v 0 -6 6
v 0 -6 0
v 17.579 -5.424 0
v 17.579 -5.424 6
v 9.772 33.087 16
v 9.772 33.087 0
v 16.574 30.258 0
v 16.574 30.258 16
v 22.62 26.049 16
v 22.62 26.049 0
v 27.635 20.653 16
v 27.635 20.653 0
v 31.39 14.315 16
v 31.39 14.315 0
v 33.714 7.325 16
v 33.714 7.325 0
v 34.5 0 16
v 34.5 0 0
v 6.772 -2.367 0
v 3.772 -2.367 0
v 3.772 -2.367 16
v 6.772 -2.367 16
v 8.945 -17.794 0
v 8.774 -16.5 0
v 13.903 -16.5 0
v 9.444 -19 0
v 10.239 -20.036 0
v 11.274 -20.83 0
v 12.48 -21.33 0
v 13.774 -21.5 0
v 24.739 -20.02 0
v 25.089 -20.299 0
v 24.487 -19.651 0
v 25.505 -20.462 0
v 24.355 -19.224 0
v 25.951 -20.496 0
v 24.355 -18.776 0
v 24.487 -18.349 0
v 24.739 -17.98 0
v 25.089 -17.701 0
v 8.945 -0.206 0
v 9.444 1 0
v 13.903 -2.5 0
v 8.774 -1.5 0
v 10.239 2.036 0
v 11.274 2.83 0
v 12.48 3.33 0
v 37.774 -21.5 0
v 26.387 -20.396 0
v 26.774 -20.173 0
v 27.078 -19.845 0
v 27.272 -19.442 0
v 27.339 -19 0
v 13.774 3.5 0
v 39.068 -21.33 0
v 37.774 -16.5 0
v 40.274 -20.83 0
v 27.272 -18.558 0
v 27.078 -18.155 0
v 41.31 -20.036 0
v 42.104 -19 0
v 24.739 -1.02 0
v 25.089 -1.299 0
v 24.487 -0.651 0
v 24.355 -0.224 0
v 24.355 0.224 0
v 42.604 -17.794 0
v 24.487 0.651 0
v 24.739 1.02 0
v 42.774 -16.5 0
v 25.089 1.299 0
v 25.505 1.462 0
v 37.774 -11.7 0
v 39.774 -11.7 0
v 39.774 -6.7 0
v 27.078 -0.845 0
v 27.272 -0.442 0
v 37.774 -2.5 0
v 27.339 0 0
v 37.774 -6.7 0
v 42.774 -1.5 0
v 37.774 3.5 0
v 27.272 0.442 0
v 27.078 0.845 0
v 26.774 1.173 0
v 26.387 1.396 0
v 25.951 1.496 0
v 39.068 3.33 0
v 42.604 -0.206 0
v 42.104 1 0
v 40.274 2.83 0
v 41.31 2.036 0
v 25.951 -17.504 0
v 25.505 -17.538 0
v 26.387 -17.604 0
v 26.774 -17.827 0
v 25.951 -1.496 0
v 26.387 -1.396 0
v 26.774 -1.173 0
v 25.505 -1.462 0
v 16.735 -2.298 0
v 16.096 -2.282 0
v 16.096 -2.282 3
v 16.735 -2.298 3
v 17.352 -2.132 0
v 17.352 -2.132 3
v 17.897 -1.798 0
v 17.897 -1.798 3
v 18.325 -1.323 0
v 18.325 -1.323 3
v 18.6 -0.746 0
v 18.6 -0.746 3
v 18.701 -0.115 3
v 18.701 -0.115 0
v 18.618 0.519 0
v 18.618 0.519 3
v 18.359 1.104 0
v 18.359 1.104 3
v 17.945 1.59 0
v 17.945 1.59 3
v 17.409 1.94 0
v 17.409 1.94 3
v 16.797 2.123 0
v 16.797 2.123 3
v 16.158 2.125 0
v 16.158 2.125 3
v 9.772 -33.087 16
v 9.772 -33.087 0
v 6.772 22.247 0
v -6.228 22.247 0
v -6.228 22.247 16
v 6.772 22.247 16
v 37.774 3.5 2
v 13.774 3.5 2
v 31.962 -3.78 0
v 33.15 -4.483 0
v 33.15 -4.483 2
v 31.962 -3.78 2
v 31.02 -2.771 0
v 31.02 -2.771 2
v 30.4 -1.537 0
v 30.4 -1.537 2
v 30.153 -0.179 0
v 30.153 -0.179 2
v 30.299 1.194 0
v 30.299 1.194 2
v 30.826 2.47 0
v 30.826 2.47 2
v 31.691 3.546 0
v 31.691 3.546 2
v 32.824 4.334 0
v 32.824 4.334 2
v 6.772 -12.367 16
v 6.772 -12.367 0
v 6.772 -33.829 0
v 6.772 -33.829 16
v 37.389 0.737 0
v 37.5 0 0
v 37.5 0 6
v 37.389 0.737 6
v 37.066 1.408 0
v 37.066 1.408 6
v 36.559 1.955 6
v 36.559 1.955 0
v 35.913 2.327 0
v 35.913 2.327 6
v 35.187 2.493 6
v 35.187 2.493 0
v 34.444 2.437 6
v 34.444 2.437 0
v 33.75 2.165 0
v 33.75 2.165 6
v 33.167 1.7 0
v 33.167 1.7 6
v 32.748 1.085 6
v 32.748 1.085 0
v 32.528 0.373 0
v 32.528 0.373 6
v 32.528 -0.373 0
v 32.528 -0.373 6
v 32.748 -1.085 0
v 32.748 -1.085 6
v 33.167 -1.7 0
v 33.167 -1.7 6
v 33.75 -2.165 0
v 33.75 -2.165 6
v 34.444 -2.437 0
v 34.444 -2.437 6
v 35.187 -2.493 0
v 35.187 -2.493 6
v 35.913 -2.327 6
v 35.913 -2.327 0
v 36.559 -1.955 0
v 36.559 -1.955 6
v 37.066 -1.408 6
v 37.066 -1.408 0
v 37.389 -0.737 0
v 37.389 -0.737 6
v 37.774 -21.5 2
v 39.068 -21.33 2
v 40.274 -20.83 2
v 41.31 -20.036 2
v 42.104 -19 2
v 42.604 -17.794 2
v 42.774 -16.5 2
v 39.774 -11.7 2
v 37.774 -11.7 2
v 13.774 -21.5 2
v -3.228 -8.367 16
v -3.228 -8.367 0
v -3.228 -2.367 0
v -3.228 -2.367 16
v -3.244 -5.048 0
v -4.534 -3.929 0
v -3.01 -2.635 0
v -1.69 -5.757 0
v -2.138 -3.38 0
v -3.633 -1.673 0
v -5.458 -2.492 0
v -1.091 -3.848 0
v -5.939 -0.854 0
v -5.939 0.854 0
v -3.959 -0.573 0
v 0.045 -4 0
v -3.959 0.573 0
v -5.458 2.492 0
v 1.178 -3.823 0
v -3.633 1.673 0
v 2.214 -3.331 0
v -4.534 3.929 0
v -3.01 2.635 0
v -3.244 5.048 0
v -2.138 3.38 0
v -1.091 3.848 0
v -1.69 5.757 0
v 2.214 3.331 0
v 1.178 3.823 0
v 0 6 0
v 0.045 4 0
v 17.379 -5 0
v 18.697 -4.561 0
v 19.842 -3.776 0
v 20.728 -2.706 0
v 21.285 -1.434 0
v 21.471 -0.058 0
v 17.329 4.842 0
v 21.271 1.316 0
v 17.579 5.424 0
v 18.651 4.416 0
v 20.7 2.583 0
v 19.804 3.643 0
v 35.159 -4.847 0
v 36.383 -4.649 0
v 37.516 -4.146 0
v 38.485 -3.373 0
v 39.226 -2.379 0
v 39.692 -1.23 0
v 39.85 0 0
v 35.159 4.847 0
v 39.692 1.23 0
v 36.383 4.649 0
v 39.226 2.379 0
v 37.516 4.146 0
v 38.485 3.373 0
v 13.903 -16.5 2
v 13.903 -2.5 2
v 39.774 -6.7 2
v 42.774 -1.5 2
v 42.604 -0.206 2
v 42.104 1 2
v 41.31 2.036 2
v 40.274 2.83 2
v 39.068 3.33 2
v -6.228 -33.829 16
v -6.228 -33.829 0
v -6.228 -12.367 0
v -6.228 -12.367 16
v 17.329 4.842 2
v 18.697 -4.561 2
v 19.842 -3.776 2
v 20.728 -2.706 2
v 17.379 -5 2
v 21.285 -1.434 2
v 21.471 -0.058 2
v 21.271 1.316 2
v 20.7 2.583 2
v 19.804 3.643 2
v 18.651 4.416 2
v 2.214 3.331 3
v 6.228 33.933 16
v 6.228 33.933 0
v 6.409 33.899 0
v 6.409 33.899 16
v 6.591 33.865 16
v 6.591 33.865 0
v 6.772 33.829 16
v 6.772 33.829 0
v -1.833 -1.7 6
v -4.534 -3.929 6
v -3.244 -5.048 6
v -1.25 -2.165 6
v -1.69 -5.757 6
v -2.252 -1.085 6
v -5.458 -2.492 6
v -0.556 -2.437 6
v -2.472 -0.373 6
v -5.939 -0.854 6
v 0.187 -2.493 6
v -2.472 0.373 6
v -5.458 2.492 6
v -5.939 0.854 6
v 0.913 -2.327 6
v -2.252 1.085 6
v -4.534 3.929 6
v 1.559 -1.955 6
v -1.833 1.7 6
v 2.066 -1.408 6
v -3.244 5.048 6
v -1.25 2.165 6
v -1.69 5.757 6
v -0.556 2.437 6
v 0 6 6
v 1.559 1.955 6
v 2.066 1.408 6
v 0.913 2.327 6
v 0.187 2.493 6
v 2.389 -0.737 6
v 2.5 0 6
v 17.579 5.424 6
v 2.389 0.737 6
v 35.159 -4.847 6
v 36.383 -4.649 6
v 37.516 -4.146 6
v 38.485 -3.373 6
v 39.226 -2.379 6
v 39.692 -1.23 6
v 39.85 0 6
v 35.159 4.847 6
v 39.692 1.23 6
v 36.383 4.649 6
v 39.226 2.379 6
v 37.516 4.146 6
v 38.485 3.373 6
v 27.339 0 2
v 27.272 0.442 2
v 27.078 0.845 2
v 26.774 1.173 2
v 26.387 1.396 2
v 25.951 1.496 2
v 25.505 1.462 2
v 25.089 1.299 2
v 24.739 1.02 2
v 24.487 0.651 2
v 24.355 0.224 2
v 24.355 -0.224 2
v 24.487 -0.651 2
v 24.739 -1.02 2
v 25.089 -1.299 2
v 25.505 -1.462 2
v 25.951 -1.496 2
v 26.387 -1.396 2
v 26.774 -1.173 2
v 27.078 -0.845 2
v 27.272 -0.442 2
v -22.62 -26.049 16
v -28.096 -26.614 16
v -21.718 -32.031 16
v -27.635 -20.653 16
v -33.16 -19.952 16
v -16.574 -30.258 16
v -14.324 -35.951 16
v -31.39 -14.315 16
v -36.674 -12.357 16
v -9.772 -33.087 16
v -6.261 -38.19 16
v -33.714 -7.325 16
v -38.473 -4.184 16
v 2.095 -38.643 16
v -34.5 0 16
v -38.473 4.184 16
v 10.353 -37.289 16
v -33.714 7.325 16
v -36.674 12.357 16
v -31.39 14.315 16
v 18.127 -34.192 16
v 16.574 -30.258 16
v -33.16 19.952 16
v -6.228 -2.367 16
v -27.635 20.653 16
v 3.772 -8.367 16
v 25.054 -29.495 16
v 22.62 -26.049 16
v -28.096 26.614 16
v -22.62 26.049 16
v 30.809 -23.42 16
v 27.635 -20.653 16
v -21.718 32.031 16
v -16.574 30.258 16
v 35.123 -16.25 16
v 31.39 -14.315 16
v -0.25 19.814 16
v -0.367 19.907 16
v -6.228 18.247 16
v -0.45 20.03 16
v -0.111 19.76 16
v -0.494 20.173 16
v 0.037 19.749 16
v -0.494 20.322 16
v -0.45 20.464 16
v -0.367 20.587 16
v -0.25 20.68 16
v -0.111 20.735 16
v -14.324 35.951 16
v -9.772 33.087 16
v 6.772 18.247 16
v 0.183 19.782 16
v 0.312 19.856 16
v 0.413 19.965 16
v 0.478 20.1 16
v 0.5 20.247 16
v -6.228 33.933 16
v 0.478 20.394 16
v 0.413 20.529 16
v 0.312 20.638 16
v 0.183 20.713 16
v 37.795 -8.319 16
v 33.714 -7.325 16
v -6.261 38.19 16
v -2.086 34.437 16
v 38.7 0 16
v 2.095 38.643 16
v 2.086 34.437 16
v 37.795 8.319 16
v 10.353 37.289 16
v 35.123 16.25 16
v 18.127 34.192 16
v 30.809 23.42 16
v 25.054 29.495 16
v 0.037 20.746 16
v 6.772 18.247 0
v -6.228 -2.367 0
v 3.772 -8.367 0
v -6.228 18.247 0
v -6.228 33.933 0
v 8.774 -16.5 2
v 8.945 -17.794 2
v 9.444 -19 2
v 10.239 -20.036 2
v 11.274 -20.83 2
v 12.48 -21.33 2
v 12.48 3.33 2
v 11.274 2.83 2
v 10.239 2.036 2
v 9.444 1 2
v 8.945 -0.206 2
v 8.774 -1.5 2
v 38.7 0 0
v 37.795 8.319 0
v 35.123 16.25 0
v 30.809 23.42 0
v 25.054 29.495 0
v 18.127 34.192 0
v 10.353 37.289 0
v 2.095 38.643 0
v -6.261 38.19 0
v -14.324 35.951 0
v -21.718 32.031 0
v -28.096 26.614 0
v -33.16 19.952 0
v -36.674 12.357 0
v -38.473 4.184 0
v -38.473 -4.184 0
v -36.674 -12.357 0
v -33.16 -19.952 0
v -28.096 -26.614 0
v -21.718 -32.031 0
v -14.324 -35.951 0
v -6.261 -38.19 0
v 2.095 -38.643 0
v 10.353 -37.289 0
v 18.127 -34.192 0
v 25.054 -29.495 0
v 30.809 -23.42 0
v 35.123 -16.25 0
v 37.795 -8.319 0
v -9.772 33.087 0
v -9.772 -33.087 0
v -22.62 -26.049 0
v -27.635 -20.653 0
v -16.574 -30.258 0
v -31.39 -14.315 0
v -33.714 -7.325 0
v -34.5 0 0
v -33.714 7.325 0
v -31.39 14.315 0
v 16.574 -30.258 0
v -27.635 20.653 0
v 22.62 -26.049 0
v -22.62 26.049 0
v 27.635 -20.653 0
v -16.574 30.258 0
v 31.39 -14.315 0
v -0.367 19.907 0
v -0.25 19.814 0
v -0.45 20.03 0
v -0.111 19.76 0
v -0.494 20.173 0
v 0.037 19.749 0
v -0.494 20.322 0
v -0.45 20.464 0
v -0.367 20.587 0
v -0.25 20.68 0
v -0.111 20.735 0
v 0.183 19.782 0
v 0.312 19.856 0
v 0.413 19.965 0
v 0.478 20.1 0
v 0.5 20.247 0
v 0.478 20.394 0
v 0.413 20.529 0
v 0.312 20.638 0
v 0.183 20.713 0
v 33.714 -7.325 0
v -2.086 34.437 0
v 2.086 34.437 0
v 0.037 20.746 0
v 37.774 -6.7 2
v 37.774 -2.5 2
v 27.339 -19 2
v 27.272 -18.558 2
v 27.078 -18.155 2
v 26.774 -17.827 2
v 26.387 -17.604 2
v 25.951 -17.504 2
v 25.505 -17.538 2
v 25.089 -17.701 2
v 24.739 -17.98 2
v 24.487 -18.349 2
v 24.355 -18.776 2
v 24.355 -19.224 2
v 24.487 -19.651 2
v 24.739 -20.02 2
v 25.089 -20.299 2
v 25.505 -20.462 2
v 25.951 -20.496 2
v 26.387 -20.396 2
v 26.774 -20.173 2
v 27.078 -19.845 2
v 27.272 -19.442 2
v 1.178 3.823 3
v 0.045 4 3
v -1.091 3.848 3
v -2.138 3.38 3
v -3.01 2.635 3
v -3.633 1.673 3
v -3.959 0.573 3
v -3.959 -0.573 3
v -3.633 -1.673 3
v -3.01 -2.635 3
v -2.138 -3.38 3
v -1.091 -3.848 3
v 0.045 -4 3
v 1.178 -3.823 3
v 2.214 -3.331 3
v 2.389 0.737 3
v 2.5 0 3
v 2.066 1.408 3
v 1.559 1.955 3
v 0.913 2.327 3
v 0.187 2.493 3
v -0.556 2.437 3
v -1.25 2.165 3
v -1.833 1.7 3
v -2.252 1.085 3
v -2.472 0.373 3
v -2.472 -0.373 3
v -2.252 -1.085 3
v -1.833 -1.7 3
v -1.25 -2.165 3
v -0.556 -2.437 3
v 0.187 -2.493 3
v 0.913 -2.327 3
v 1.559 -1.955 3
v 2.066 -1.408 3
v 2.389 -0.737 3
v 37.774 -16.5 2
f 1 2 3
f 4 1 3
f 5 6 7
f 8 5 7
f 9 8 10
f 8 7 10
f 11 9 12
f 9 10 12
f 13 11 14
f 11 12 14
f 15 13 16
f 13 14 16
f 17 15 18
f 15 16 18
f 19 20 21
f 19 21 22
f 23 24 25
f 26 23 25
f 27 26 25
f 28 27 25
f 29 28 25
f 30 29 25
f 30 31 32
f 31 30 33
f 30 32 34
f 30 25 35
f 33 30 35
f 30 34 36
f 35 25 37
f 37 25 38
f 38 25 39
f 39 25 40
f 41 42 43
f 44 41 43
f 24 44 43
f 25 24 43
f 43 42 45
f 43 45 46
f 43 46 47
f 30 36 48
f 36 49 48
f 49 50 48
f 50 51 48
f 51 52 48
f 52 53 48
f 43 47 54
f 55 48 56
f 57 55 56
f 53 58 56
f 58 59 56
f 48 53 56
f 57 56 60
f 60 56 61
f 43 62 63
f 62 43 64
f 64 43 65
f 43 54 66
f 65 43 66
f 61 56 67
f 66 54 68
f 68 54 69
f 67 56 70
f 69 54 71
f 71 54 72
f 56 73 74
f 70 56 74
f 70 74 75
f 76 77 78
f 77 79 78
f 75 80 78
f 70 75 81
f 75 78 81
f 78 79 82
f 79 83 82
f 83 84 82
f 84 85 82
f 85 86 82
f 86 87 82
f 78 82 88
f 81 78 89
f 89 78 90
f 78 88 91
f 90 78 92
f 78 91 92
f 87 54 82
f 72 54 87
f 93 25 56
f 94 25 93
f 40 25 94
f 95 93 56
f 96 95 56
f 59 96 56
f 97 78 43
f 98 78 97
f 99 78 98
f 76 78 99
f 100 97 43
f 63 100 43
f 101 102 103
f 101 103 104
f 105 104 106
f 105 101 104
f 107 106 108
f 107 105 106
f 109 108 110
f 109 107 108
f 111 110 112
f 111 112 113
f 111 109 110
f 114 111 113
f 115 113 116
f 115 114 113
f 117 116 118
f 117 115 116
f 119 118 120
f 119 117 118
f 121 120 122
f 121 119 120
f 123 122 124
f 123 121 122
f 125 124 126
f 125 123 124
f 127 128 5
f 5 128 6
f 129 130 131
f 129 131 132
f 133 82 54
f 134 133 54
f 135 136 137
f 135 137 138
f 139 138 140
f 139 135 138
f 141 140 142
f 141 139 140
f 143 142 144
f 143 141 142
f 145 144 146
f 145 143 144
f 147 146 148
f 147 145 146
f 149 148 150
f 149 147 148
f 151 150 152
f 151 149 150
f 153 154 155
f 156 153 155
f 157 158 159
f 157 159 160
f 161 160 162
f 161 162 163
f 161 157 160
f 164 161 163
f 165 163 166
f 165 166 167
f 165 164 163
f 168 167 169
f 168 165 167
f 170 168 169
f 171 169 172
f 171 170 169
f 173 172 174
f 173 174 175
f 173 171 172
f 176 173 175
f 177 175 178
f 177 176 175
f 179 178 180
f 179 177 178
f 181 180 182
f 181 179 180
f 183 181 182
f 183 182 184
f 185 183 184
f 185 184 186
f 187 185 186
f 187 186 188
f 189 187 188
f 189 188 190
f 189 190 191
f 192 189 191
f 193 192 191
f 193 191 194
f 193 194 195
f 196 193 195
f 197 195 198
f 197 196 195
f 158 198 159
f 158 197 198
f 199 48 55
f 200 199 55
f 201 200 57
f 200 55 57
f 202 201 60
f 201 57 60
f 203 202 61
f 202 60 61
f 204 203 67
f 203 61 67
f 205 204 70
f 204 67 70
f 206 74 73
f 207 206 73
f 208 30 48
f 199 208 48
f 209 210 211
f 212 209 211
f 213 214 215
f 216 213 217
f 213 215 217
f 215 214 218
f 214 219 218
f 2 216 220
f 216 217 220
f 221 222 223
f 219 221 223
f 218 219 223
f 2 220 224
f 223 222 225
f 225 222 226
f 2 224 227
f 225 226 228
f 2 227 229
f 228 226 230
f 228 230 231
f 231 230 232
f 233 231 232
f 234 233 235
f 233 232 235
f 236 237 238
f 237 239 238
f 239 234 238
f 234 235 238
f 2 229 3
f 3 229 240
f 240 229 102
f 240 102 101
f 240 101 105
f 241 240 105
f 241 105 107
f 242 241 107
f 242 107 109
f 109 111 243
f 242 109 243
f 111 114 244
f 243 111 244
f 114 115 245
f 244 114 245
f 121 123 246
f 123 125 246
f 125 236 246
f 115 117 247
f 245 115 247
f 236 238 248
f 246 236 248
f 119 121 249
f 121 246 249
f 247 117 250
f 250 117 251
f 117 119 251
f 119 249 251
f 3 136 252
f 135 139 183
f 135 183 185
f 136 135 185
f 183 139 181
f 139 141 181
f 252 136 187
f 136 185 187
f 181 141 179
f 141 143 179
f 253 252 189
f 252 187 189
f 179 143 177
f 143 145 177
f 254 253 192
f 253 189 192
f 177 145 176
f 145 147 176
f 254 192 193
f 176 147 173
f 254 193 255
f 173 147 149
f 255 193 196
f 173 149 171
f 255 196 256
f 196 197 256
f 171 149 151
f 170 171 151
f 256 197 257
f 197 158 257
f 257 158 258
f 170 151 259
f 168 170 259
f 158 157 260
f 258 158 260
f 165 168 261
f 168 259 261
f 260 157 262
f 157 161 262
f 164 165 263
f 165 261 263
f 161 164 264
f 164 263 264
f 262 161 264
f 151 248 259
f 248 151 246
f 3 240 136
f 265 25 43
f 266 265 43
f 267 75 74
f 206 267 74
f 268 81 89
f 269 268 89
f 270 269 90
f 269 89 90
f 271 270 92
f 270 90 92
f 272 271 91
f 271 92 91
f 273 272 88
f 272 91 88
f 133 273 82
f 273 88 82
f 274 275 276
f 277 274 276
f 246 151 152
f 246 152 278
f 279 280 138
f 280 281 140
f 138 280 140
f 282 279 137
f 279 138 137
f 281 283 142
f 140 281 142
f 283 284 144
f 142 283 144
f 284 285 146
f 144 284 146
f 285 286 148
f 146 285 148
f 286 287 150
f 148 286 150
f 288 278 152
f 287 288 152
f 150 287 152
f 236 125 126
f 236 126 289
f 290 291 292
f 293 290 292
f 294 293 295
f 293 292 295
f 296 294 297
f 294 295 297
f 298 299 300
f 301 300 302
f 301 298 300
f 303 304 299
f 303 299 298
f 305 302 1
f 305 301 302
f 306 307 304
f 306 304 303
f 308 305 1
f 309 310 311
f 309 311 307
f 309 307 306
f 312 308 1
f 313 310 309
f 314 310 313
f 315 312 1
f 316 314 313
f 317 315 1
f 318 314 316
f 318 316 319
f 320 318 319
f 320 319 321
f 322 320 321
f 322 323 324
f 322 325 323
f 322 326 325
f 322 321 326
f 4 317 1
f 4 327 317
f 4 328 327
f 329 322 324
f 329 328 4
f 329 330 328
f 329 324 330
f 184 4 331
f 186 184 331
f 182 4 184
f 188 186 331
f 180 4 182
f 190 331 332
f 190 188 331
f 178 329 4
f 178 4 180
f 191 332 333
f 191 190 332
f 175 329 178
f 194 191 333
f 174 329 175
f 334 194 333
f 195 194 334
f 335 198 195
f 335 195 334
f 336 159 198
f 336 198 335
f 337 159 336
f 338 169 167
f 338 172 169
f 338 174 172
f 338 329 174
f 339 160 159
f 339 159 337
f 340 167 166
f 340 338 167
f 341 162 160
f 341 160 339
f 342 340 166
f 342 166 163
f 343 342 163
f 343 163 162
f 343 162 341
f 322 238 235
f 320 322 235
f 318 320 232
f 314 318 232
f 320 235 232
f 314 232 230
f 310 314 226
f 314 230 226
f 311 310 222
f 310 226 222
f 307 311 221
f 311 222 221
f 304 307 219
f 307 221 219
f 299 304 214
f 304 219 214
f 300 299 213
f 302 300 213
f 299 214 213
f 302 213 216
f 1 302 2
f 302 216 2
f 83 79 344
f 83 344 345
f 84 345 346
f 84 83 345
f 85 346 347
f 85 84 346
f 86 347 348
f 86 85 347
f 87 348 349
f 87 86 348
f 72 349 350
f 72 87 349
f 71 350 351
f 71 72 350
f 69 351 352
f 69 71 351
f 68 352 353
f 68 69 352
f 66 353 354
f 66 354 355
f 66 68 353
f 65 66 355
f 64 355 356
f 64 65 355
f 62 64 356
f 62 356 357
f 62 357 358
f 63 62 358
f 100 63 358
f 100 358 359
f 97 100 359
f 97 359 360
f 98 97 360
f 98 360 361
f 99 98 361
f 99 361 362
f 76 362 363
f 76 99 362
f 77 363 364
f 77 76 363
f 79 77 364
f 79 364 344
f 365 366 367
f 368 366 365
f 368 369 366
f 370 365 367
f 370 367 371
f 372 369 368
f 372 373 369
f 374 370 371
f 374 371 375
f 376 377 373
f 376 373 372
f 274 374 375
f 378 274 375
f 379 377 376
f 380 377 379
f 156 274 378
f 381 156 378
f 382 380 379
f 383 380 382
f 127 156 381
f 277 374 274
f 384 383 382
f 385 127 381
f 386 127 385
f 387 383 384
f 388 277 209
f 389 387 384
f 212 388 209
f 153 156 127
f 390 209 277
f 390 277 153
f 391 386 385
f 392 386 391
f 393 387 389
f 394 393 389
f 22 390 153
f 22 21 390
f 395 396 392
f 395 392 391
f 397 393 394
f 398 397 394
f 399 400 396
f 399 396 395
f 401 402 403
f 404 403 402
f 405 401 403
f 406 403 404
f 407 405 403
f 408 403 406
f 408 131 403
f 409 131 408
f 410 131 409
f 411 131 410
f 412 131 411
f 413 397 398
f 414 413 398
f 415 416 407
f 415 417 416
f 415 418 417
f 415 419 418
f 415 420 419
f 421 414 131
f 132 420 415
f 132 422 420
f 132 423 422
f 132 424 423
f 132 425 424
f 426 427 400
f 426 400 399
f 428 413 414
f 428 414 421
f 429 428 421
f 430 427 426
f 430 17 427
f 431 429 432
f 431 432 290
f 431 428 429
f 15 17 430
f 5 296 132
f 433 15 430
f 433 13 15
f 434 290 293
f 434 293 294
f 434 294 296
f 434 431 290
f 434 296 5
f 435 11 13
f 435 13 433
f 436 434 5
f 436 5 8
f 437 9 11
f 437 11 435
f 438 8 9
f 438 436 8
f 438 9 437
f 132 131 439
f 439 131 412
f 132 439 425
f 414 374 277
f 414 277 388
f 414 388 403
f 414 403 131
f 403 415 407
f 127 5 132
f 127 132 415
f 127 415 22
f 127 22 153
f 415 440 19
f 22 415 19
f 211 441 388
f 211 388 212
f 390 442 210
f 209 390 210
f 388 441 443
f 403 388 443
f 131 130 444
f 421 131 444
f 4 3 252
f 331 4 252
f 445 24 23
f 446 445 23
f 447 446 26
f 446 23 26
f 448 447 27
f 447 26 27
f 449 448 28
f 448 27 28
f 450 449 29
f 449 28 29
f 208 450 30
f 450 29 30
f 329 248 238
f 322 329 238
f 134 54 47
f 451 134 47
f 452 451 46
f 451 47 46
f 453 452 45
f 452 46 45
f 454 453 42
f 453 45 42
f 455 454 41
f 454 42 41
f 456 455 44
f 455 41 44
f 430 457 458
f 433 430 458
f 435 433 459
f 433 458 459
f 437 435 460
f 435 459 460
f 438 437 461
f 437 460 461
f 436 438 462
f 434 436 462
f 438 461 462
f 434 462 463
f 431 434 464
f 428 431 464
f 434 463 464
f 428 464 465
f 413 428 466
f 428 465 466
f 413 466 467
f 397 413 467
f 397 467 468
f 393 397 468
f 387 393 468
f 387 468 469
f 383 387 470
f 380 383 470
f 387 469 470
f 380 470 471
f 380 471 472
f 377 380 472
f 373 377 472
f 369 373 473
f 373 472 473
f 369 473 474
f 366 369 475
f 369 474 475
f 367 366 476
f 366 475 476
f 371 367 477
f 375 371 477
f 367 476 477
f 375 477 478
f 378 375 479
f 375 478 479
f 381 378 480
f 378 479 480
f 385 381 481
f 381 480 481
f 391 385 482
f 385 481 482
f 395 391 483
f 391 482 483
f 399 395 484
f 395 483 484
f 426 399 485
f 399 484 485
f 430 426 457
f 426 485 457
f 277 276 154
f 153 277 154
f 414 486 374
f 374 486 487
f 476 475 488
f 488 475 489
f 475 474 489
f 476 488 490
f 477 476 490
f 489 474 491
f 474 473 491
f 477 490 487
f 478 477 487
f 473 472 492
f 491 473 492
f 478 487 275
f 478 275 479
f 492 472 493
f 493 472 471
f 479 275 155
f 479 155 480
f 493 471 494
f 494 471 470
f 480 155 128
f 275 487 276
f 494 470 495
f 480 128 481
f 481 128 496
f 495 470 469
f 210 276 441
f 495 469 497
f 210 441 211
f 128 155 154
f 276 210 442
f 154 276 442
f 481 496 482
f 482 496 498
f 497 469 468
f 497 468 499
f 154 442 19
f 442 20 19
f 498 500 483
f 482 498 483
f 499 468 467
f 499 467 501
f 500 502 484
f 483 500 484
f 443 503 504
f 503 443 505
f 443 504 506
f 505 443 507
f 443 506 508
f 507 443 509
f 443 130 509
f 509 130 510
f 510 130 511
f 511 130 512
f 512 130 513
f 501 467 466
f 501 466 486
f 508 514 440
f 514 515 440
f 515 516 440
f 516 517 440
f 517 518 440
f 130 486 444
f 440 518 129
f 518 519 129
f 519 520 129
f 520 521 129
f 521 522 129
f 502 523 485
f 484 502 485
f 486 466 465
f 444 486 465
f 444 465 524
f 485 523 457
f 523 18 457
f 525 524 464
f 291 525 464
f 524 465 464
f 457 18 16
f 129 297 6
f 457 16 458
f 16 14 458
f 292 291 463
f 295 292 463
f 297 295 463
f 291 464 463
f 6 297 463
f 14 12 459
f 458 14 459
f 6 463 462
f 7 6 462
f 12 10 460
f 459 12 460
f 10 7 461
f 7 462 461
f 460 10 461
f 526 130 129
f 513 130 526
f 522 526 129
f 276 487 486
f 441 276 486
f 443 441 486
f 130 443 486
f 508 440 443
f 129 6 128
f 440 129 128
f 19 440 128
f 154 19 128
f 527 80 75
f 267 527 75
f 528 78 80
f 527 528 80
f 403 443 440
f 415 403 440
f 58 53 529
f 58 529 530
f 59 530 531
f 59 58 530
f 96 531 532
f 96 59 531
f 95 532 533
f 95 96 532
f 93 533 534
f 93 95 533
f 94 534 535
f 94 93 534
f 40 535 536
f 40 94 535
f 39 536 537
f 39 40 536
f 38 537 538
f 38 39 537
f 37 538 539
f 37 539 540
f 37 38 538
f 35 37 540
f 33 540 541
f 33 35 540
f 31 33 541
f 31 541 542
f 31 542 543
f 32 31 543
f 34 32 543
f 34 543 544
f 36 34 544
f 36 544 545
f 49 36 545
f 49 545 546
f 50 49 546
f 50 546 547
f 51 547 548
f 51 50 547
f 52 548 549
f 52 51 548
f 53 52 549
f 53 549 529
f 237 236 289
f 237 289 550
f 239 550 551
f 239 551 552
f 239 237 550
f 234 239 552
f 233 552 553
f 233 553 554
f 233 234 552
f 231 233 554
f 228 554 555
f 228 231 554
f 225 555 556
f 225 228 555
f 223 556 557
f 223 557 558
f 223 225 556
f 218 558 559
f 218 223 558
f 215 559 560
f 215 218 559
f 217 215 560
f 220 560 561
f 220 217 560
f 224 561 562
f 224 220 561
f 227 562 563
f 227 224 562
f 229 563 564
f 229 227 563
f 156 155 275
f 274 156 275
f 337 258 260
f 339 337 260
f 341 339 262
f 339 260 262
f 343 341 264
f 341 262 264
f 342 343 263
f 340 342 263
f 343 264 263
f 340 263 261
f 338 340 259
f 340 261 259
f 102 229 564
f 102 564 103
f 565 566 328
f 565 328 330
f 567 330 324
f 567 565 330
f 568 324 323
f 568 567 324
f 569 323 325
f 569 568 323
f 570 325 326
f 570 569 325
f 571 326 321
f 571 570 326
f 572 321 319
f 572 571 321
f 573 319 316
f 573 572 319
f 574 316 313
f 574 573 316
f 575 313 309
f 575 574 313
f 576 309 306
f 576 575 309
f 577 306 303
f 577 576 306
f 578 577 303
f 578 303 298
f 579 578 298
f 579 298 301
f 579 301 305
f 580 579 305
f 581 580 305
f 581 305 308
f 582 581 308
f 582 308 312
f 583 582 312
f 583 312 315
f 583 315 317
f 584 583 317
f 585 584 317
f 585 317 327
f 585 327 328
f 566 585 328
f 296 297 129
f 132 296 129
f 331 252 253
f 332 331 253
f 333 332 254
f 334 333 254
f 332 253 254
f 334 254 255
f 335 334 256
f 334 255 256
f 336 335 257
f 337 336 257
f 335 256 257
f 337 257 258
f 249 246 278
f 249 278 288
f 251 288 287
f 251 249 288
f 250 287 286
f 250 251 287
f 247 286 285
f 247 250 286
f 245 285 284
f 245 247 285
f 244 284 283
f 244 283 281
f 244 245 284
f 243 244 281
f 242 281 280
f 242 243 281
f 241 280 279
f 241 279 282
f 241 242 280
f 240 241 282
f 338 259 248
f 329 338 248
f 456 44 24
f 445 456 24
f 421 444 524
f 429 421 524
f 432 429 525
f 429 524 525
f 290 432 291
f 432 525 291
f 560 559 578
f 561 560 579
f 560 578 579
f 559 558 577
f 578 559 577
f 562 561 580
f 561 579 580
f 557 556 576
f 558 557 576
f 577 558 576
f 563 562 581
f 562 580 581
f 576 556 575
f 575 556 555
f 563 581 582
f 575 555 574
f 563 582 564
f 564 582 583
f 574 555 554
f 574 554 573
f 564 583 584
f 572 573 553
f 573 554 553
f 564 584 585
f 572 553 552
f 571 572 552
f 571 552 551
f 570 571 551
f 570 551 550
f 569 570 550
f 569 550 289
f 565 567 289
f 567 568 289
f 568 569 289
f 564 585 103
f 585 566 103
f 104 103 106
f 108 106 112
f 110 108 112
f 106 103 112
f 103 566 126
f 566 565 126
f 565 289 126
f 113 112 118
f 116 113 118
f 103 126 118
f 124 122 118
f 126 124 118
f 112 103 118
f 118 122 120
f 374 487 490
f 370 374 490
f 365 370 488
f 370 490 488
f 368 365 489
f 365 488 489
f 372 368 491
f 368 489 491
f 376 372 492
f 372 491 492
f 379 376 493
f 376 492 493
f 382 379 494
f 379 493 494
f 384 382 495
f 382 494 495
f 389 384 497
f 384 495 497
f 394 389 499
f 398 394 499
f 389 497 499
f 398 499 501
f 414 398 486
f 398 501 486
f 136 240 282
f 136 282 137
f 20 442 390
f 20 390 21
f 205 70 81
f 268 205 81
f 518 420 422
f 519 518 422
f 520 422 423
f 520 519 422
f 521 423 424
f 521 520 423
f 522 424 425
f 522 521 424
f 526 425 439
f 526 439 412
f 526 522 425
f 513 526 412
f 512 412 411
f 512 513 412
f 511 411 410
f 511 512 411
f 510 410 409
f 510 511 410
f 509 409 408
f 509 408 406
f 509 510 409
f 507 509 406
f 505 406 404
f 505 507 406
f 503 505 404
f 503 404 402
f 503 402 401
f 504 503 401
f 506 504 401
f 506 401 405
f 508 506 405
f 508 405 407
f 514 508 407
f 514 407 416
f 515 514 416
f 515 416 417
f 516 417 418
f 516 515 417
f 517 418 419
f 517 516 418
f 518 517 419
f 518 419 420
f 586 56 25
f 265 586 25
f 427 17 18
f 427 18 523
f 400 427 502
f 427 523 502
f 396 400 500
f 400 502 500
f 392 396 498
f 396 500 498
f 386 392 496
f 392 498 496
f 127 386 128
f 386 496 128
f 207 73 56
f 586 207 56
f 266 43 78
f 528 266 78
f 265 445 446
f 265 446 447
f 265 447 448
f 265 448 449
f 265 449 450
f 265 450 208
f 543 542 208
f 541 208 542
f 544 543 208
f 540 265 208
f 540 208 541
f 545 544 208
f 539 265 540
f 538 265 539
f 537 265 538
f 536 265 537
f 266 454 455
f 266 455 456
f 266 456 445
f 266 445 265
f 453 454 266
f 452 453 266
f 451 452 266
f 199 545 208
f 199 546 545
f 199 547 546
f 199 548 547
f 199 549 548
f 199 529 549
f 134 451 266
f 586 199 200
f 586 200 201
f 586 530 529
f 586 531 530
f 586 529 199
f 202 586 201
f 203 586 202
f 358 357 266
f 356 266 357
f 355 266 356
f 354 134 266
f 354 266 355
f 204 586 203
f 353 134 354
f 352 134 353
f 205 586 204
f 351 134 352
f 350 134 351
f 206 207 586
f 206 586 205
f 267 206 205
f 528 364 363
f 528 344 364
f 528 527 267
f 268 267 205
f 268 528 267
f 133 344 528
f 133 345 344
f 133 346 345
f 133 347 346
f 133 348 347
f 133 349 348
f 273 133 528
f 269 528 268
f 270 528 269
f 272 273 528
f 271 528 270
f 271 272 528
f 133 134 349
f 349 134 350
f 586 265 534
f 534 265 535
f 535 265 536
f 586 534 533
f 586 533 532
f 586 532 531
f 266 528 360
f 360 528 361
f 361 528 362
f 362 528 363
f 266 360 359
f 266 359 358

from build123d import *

# Parameters (mm, degrees)
F0_R     = 1.5
F1_DEPTH = 2
F2_R     = 2.5
F3_DEPTH = 6
F4_DEPTH = 6
F5_DEPTH = 3
F6_DEPTH = 2
F7_R     = 38.6996597828
F7_W     = 3
F7_H     = 6
F7_W_2   = 13
F7_H_2   = 4
F7_R_2   = 0.5
F8_DEPTH = 16


with BuildPart() as f1:
    # F0 (on Top) → F1 (new body)
    with BuildSketch(Plane.XY):
        with BuildLine():
            Line((37.7742823958, 3.5), (13.7742823958, 3.5))
            ThreePointArc((13.7742823958, 3.5), (10.2387484899, 2.0355339059), (8.7742823958, -1.5))
            Line((8.7742823958, -1.5), (8.7742823958, -16.5))
            ThreePointArc((8.7742823958, -16.5), (10.2387484899, -20.0355339059), (13.7742823958, -21.5))
            Line((13.7742823958, -21.5), (37.7742823958, -21.5))
            ThreePointArc((37.7742823958, -21.5), (41.3098163018, -20.0355339059), (42.7742823958, -16.5))
            Line((42.7742823958, -16.5), (42.7742823958, -1.5))
            ThreePointArc((42.7742823958, -1.5), (41.3098163018, 2.0355339059), (37.7742823958, 3.5))
        make_face()
        with Locations((25.8386814408, -19)):
            Circle(F0_R, mode=Mode.SUBTRACT)
        Polygon((13.9030804858, -16.5), (13.9030804858, -2.5), (37.7742823958, -2.5), (37.7742823958, -6.7), (39.7742823958, -6.7), (39.7742823958, -11.7), (37.7742823958, -11.7), (37.7742823958, -16.5), align=None, mode=Mode.SUBTRACT)
        with Locations((25.8386814408, 0)):
            Circle(F0_R, mode=Mode.SUBTRACT)
    extrude(amount=F1_DEPTH)


with BuildPart() as f3:
    # F2 (on Top) → F3 (new body)
    with BuildSketch(Plane.XY):
        with BuildLine():
            Line((17.5794553661, 5.423697969), (0, 6))
            ThreePointArc((0, 6), (-6, 0), (0, -6))
            Line((0, -6), (17.5794553661, -5.423697969))
            Line((17.5794553661, -5.423697969), (17.3794570281, -5.0002082628))
            Line((17.3794570281, -5.0002082628), (16.0959043206, -2.2823288828))
            Line((16.0959043206, -2.2823288828), (2.2140783206, -3.331344652))
            ThreePointArc((2.2140783206, -3.331344652), (-4, 0), (2.2140783206, 3.331344652))
            Line((2.2140783206, 3.331344652), (16.1575759853, 2.1249358199))
            Line((16.1575759853, 2.1249358199), (17.3288441212, 4.8422795309))
            Line((17.3288441212, 4.8422795309), (17.5794553661, 5.423697969))
        make_face()
        with BuildLine():
            ThreePointArc((17.3794570281, -5.0002082628), (21.4705136181, -0.0577968417), (17.3288441212, 4.8422795309))
            Line((17.3288441212, 4.8422795309), (16.1575759853, 2.1249358199))
            ThreePointArc((16.1575759853, 2.1249358199), (18.7008759361, -0.1147168864), (16.0959043206, -2.2823288828))
            Line((16.0959043206, -2.2823288828), (17.3794570281, -5.0002082628))
        make_face()
        with BuildLine():
            ThreePointArc((39.85, 0), (38.4851984916, 3.3728165492), (35.1589107322, 4.8473959379))
            ThreePointArc((35.1589107322, 4.8473959379), (33.95920204, 4.7370074526), (32.8237171443, 4.3343157397))
            ThreePointArc((32.8237171443, 4.3343157397), (30.1533127814, -0.179228917), (33.149786536, -4.4832142641))
            ThreePointArc((33.149786536, -4.4832142641), (34.1349662981, -4.7722339312), (35.1589107322, -4.8473959379))
            ThreePointArc((35.1589107322, -4.8473959379), (38.4851984916, -3.3728165492), (39.85, 0))
        make_face()
        with Locations((35, 0)):
            Circle(F2_R, mode=Mode.SUBTRACT)
        with BuildLine():
            ThreePointArc((16.0959043206, -2.2823288828), (18.7008759361, -0.1147168864), (16.1575759853, 2.1249358199))
            Line((16.1575759853, 2.1249358199), (2.2140783206, 3.331344652))
            ThreePointArc((2.2140783206, 3.331344652), (-4, 0), (2.2140783206, -3.331344652))
            Line((2.2140783206, -3.331344652), (16.0959043206, -2.2823288828))
        make_face()
        Circle(F2_R, mode=Mode.SUBTRACT)
        with BuildLine():
            Line((32.8237171443, 4.3343157397), (17.3288441212, 4.8422795309))
            ThreePointArc((17.3288441212, 4.8422795309), (21.4705136181, -0.0577968417), (17.3794570281, -5.0002082628))
            Line((17.3794570281, -5.0002082628), (33.149786536, -4.4832142641))
            ThreePointArc((33.149786536, -4.4832142641), (30.1533127814, -0.179228917), (32.8237171443, 4.3343157397))
        make_face()
    extrude(amount=F3_DEPTH)

    # F2 (on Top) → F4 (join)
    with BuildSketch(Plane.XY):
        with BuildLine():
            Line((35.1589107322, 4.8473959379), (17.5794553661, 5.423697969))
            Line((17.5794553661, 5.423697969), (17.3288441212, 4.8422795309))
            Line((17.3288441212, 4.8422795309), (32.8237171443, 4.3343157397))
            ThreePointArc((32.8237171443, 4.3343157397), (33.95920204, 4.7370074526), (35.1589107322, 4.8473959379))
        make_face()
        with BuildLine():
            Line((17.3794570281, -5.0002082628), (17.5794553661, -5.423697969))
            Line((17.5794553661, -5.423697969), (35.1589107322, -4.8473959379))
            ThreePointArc((35.1589107322, -4.8473959379), (34.1349662981, -4.7722339312), (33.149786536, -4.4832142641))
            Line((33.149786536, -4.4832142641), (17.3794570281, -5.0002082628))
        make_face()
    extrude(amount=F4_DEPTH)

    # F2 (on Top) → F5 (cut)
    with BuildSketch(Plane.XY):
        with BuildLine():
            ThreePointArc((16.0959043206, -2.2823288828), (18.7008759361, -0.1147168864), (16.1575759853, 2.1249358199))
            Line((16.1575759853, 2.1249358199), (2.2140783206, 3.331344652))
            ThreePointArc((2.2140783206, 3.331344652), (-4, 0), (2.2140783206, -3.331344652))
            Line((2.2140783206, -3.331344652), (16.0959043206, -2.2823288828))
        make_face()
        Circle(F2_R, mode=Mode.SUBTRACT)
    extrude(amount=F5_DEPTH, mode=Mode.SUBTRACT)

    # F2 (on Top) → F6 (cut)
    with BuildSketch(Plane.XY):
        with BuildLine():
            Line((32.8237171443, 4.3343157397), (17.3288441212, 4.8422795309))
            ThreePointArc((17.3288441212, 4.8422795309), (21.4705136181, -0.0577968417), (17.3794570281, -5.0002082628))
            Line((17.3794570281, -5.0002082628), (33.149786536, -4.4832142641))
            ThreePointArc((33.149786536, -4.4832142641), (30.1533127814, -0.179228917), (32.8237171443, 4.3343157397))
        make_face()
    extrude(amount=F6_DEPTH, mode=Mode.SUBTRACT)


with BuildPart() as f8:
    # F7 (on Top) → F8 (new body)
    with BuildSketch(Plane.XY):
        Circle(F7_R)
        with BuildLine():
            ThreePointArc((9.7724765655, 33.0869868948), (27.6351265739, 20.653081592), (34.5, 0))
            ThreePointArc((34.5, 0), (27.6351265739, -20.653081592), (9.7724765655, -33.0869868948))
            ThreePointArc((9.7724765655, -33.0869868948), (8.2807860411, -33.4914702953), (6.7724765655, -33.8287386872))
            ThreePointArc((6.7724765655, -33.8287386872), (-1.5451695475, -34.4653804719), (-9.7724765655, -33.0869868948))
            ThreePointArc((-9.7724765655, -33.0869868948), (-34.5, 0), (-9.7724765655, 33.0869868948))
            ThreePointArc((-9.7724765655, 33.0869868948), (-8.0111831757, 33.5569805573), (-6.2275234345, 33.9332867826))
            ThreePointArc((-6.2275234345, 33.9332867826), (0, 34.5), (6.2275234345, 33.9332867826))
            ThreePointArc((6.2275234345, 33.9332867826), (6.5002101948, 33.8821083675), (6.7724765655, 33.8287386872))
            ThreePointArc((6.7724765655, 33.8287386872), (8.2807860411, 33.4914702953), (9.7724765655, 33.0869868948))
        make_face(mode=Mode.SUBTRACT)
        with Locations((5.2724765655, -5.3665565625)):
            Rectangle(F7_W, F7_H)
        with Locations((-4.7275234345, -5.3665565625)):
            Rectangle(F7_W, F7_H)
        with BuildLine():
            Line((9.7724765655, -33.0869868948), (9.7724765655, 33.0869868948))
            ThreePointArc((9.7724765655, 33.0869868948), (8.2807860411, 33.4914702953), (6.7724765655, 33.8287386872))
            Line((6.7724765655, 33.8287386872), (6.7724765655, 22.2471028529))
            Line((6.7724765655, 22.2471028529), (6.7724765655, 18.2471028529))
            Line((6.7724765655, 18.2471028529), (6.7724765655, -2.3665565625))
            Line((6.7724765655, -2.3665565625), (6.7724765655, -8.3665565625))
            Line((6.7724765655, -8.3665565625), (6.7724765655, -12.3665565625))
            Line((6.7724765655, -12.3665565625), (6.7724765655, -33.8287386872))
            ThreePointArc((6.7724765655, -33.8287386872), (8.2807860411, -33.4914702953), (9.7724765655, -33.0869868948))
        make_face()
        with Locations((0.2724765655, 20.2471028529)):
            Rectangle(F7_W_2, F7_H_2)
        with Locations((0, 20.2471028529)):
            Circle(F7_R_2, mode=Mode.SUBTRACT)
        with BuildLine():
            ThreePointArc((-9.7724765655, -33.0869868948), (-1.5451695475, -34.4653804719), (6.7724765655, -33.8287386872))
            Line((6.7724765655, -33.8287386872), (-6.2275234345, -33.8287386872))
            Line((-6.2275234345, -33.8287386872), (-6.2275234345, -12.3665565625))
            Line((-6.2275234345, -12.3665565625), (-6.2275234345, -8.3665565625))
            Line((-6.2275234345, -8.3665565625), (-6.2275234345, -2.3665565625))
            Line((-6.2275234345, -2.3665565625), (-6.2275234345, 18.2471028529))
            Line((-6.2275234345, 18.2471028529), (-6.2275234345, 22.2471028529))
            Line((-6.2275234345, 22.2471028529), (-6.2275234345, 33.9332867826))
            ThreePointArc((-6.2275234345, 33.9332867826), (-8.0111831757, 33.5569805573), (-9.7724765655, 33.0869868948))
            Line((-9.7724765655, 33.0869868948), (-9.7724765655, -33.0869868948))
        make_face()
        Polygon((-6.2275234345, -12.3665565625), (6.7724765655, -12.3665565625), (6.7724765655, -8.3665565625), (3.7724765655, -8.3665565625), (-3.2275234345, -8.3665565625), (-6.2275234345, -8.3665565625), align=None)
    extrude(amount=F8_DEPTH)


solid = Compound([f1.part, f3.part, f8.part])
